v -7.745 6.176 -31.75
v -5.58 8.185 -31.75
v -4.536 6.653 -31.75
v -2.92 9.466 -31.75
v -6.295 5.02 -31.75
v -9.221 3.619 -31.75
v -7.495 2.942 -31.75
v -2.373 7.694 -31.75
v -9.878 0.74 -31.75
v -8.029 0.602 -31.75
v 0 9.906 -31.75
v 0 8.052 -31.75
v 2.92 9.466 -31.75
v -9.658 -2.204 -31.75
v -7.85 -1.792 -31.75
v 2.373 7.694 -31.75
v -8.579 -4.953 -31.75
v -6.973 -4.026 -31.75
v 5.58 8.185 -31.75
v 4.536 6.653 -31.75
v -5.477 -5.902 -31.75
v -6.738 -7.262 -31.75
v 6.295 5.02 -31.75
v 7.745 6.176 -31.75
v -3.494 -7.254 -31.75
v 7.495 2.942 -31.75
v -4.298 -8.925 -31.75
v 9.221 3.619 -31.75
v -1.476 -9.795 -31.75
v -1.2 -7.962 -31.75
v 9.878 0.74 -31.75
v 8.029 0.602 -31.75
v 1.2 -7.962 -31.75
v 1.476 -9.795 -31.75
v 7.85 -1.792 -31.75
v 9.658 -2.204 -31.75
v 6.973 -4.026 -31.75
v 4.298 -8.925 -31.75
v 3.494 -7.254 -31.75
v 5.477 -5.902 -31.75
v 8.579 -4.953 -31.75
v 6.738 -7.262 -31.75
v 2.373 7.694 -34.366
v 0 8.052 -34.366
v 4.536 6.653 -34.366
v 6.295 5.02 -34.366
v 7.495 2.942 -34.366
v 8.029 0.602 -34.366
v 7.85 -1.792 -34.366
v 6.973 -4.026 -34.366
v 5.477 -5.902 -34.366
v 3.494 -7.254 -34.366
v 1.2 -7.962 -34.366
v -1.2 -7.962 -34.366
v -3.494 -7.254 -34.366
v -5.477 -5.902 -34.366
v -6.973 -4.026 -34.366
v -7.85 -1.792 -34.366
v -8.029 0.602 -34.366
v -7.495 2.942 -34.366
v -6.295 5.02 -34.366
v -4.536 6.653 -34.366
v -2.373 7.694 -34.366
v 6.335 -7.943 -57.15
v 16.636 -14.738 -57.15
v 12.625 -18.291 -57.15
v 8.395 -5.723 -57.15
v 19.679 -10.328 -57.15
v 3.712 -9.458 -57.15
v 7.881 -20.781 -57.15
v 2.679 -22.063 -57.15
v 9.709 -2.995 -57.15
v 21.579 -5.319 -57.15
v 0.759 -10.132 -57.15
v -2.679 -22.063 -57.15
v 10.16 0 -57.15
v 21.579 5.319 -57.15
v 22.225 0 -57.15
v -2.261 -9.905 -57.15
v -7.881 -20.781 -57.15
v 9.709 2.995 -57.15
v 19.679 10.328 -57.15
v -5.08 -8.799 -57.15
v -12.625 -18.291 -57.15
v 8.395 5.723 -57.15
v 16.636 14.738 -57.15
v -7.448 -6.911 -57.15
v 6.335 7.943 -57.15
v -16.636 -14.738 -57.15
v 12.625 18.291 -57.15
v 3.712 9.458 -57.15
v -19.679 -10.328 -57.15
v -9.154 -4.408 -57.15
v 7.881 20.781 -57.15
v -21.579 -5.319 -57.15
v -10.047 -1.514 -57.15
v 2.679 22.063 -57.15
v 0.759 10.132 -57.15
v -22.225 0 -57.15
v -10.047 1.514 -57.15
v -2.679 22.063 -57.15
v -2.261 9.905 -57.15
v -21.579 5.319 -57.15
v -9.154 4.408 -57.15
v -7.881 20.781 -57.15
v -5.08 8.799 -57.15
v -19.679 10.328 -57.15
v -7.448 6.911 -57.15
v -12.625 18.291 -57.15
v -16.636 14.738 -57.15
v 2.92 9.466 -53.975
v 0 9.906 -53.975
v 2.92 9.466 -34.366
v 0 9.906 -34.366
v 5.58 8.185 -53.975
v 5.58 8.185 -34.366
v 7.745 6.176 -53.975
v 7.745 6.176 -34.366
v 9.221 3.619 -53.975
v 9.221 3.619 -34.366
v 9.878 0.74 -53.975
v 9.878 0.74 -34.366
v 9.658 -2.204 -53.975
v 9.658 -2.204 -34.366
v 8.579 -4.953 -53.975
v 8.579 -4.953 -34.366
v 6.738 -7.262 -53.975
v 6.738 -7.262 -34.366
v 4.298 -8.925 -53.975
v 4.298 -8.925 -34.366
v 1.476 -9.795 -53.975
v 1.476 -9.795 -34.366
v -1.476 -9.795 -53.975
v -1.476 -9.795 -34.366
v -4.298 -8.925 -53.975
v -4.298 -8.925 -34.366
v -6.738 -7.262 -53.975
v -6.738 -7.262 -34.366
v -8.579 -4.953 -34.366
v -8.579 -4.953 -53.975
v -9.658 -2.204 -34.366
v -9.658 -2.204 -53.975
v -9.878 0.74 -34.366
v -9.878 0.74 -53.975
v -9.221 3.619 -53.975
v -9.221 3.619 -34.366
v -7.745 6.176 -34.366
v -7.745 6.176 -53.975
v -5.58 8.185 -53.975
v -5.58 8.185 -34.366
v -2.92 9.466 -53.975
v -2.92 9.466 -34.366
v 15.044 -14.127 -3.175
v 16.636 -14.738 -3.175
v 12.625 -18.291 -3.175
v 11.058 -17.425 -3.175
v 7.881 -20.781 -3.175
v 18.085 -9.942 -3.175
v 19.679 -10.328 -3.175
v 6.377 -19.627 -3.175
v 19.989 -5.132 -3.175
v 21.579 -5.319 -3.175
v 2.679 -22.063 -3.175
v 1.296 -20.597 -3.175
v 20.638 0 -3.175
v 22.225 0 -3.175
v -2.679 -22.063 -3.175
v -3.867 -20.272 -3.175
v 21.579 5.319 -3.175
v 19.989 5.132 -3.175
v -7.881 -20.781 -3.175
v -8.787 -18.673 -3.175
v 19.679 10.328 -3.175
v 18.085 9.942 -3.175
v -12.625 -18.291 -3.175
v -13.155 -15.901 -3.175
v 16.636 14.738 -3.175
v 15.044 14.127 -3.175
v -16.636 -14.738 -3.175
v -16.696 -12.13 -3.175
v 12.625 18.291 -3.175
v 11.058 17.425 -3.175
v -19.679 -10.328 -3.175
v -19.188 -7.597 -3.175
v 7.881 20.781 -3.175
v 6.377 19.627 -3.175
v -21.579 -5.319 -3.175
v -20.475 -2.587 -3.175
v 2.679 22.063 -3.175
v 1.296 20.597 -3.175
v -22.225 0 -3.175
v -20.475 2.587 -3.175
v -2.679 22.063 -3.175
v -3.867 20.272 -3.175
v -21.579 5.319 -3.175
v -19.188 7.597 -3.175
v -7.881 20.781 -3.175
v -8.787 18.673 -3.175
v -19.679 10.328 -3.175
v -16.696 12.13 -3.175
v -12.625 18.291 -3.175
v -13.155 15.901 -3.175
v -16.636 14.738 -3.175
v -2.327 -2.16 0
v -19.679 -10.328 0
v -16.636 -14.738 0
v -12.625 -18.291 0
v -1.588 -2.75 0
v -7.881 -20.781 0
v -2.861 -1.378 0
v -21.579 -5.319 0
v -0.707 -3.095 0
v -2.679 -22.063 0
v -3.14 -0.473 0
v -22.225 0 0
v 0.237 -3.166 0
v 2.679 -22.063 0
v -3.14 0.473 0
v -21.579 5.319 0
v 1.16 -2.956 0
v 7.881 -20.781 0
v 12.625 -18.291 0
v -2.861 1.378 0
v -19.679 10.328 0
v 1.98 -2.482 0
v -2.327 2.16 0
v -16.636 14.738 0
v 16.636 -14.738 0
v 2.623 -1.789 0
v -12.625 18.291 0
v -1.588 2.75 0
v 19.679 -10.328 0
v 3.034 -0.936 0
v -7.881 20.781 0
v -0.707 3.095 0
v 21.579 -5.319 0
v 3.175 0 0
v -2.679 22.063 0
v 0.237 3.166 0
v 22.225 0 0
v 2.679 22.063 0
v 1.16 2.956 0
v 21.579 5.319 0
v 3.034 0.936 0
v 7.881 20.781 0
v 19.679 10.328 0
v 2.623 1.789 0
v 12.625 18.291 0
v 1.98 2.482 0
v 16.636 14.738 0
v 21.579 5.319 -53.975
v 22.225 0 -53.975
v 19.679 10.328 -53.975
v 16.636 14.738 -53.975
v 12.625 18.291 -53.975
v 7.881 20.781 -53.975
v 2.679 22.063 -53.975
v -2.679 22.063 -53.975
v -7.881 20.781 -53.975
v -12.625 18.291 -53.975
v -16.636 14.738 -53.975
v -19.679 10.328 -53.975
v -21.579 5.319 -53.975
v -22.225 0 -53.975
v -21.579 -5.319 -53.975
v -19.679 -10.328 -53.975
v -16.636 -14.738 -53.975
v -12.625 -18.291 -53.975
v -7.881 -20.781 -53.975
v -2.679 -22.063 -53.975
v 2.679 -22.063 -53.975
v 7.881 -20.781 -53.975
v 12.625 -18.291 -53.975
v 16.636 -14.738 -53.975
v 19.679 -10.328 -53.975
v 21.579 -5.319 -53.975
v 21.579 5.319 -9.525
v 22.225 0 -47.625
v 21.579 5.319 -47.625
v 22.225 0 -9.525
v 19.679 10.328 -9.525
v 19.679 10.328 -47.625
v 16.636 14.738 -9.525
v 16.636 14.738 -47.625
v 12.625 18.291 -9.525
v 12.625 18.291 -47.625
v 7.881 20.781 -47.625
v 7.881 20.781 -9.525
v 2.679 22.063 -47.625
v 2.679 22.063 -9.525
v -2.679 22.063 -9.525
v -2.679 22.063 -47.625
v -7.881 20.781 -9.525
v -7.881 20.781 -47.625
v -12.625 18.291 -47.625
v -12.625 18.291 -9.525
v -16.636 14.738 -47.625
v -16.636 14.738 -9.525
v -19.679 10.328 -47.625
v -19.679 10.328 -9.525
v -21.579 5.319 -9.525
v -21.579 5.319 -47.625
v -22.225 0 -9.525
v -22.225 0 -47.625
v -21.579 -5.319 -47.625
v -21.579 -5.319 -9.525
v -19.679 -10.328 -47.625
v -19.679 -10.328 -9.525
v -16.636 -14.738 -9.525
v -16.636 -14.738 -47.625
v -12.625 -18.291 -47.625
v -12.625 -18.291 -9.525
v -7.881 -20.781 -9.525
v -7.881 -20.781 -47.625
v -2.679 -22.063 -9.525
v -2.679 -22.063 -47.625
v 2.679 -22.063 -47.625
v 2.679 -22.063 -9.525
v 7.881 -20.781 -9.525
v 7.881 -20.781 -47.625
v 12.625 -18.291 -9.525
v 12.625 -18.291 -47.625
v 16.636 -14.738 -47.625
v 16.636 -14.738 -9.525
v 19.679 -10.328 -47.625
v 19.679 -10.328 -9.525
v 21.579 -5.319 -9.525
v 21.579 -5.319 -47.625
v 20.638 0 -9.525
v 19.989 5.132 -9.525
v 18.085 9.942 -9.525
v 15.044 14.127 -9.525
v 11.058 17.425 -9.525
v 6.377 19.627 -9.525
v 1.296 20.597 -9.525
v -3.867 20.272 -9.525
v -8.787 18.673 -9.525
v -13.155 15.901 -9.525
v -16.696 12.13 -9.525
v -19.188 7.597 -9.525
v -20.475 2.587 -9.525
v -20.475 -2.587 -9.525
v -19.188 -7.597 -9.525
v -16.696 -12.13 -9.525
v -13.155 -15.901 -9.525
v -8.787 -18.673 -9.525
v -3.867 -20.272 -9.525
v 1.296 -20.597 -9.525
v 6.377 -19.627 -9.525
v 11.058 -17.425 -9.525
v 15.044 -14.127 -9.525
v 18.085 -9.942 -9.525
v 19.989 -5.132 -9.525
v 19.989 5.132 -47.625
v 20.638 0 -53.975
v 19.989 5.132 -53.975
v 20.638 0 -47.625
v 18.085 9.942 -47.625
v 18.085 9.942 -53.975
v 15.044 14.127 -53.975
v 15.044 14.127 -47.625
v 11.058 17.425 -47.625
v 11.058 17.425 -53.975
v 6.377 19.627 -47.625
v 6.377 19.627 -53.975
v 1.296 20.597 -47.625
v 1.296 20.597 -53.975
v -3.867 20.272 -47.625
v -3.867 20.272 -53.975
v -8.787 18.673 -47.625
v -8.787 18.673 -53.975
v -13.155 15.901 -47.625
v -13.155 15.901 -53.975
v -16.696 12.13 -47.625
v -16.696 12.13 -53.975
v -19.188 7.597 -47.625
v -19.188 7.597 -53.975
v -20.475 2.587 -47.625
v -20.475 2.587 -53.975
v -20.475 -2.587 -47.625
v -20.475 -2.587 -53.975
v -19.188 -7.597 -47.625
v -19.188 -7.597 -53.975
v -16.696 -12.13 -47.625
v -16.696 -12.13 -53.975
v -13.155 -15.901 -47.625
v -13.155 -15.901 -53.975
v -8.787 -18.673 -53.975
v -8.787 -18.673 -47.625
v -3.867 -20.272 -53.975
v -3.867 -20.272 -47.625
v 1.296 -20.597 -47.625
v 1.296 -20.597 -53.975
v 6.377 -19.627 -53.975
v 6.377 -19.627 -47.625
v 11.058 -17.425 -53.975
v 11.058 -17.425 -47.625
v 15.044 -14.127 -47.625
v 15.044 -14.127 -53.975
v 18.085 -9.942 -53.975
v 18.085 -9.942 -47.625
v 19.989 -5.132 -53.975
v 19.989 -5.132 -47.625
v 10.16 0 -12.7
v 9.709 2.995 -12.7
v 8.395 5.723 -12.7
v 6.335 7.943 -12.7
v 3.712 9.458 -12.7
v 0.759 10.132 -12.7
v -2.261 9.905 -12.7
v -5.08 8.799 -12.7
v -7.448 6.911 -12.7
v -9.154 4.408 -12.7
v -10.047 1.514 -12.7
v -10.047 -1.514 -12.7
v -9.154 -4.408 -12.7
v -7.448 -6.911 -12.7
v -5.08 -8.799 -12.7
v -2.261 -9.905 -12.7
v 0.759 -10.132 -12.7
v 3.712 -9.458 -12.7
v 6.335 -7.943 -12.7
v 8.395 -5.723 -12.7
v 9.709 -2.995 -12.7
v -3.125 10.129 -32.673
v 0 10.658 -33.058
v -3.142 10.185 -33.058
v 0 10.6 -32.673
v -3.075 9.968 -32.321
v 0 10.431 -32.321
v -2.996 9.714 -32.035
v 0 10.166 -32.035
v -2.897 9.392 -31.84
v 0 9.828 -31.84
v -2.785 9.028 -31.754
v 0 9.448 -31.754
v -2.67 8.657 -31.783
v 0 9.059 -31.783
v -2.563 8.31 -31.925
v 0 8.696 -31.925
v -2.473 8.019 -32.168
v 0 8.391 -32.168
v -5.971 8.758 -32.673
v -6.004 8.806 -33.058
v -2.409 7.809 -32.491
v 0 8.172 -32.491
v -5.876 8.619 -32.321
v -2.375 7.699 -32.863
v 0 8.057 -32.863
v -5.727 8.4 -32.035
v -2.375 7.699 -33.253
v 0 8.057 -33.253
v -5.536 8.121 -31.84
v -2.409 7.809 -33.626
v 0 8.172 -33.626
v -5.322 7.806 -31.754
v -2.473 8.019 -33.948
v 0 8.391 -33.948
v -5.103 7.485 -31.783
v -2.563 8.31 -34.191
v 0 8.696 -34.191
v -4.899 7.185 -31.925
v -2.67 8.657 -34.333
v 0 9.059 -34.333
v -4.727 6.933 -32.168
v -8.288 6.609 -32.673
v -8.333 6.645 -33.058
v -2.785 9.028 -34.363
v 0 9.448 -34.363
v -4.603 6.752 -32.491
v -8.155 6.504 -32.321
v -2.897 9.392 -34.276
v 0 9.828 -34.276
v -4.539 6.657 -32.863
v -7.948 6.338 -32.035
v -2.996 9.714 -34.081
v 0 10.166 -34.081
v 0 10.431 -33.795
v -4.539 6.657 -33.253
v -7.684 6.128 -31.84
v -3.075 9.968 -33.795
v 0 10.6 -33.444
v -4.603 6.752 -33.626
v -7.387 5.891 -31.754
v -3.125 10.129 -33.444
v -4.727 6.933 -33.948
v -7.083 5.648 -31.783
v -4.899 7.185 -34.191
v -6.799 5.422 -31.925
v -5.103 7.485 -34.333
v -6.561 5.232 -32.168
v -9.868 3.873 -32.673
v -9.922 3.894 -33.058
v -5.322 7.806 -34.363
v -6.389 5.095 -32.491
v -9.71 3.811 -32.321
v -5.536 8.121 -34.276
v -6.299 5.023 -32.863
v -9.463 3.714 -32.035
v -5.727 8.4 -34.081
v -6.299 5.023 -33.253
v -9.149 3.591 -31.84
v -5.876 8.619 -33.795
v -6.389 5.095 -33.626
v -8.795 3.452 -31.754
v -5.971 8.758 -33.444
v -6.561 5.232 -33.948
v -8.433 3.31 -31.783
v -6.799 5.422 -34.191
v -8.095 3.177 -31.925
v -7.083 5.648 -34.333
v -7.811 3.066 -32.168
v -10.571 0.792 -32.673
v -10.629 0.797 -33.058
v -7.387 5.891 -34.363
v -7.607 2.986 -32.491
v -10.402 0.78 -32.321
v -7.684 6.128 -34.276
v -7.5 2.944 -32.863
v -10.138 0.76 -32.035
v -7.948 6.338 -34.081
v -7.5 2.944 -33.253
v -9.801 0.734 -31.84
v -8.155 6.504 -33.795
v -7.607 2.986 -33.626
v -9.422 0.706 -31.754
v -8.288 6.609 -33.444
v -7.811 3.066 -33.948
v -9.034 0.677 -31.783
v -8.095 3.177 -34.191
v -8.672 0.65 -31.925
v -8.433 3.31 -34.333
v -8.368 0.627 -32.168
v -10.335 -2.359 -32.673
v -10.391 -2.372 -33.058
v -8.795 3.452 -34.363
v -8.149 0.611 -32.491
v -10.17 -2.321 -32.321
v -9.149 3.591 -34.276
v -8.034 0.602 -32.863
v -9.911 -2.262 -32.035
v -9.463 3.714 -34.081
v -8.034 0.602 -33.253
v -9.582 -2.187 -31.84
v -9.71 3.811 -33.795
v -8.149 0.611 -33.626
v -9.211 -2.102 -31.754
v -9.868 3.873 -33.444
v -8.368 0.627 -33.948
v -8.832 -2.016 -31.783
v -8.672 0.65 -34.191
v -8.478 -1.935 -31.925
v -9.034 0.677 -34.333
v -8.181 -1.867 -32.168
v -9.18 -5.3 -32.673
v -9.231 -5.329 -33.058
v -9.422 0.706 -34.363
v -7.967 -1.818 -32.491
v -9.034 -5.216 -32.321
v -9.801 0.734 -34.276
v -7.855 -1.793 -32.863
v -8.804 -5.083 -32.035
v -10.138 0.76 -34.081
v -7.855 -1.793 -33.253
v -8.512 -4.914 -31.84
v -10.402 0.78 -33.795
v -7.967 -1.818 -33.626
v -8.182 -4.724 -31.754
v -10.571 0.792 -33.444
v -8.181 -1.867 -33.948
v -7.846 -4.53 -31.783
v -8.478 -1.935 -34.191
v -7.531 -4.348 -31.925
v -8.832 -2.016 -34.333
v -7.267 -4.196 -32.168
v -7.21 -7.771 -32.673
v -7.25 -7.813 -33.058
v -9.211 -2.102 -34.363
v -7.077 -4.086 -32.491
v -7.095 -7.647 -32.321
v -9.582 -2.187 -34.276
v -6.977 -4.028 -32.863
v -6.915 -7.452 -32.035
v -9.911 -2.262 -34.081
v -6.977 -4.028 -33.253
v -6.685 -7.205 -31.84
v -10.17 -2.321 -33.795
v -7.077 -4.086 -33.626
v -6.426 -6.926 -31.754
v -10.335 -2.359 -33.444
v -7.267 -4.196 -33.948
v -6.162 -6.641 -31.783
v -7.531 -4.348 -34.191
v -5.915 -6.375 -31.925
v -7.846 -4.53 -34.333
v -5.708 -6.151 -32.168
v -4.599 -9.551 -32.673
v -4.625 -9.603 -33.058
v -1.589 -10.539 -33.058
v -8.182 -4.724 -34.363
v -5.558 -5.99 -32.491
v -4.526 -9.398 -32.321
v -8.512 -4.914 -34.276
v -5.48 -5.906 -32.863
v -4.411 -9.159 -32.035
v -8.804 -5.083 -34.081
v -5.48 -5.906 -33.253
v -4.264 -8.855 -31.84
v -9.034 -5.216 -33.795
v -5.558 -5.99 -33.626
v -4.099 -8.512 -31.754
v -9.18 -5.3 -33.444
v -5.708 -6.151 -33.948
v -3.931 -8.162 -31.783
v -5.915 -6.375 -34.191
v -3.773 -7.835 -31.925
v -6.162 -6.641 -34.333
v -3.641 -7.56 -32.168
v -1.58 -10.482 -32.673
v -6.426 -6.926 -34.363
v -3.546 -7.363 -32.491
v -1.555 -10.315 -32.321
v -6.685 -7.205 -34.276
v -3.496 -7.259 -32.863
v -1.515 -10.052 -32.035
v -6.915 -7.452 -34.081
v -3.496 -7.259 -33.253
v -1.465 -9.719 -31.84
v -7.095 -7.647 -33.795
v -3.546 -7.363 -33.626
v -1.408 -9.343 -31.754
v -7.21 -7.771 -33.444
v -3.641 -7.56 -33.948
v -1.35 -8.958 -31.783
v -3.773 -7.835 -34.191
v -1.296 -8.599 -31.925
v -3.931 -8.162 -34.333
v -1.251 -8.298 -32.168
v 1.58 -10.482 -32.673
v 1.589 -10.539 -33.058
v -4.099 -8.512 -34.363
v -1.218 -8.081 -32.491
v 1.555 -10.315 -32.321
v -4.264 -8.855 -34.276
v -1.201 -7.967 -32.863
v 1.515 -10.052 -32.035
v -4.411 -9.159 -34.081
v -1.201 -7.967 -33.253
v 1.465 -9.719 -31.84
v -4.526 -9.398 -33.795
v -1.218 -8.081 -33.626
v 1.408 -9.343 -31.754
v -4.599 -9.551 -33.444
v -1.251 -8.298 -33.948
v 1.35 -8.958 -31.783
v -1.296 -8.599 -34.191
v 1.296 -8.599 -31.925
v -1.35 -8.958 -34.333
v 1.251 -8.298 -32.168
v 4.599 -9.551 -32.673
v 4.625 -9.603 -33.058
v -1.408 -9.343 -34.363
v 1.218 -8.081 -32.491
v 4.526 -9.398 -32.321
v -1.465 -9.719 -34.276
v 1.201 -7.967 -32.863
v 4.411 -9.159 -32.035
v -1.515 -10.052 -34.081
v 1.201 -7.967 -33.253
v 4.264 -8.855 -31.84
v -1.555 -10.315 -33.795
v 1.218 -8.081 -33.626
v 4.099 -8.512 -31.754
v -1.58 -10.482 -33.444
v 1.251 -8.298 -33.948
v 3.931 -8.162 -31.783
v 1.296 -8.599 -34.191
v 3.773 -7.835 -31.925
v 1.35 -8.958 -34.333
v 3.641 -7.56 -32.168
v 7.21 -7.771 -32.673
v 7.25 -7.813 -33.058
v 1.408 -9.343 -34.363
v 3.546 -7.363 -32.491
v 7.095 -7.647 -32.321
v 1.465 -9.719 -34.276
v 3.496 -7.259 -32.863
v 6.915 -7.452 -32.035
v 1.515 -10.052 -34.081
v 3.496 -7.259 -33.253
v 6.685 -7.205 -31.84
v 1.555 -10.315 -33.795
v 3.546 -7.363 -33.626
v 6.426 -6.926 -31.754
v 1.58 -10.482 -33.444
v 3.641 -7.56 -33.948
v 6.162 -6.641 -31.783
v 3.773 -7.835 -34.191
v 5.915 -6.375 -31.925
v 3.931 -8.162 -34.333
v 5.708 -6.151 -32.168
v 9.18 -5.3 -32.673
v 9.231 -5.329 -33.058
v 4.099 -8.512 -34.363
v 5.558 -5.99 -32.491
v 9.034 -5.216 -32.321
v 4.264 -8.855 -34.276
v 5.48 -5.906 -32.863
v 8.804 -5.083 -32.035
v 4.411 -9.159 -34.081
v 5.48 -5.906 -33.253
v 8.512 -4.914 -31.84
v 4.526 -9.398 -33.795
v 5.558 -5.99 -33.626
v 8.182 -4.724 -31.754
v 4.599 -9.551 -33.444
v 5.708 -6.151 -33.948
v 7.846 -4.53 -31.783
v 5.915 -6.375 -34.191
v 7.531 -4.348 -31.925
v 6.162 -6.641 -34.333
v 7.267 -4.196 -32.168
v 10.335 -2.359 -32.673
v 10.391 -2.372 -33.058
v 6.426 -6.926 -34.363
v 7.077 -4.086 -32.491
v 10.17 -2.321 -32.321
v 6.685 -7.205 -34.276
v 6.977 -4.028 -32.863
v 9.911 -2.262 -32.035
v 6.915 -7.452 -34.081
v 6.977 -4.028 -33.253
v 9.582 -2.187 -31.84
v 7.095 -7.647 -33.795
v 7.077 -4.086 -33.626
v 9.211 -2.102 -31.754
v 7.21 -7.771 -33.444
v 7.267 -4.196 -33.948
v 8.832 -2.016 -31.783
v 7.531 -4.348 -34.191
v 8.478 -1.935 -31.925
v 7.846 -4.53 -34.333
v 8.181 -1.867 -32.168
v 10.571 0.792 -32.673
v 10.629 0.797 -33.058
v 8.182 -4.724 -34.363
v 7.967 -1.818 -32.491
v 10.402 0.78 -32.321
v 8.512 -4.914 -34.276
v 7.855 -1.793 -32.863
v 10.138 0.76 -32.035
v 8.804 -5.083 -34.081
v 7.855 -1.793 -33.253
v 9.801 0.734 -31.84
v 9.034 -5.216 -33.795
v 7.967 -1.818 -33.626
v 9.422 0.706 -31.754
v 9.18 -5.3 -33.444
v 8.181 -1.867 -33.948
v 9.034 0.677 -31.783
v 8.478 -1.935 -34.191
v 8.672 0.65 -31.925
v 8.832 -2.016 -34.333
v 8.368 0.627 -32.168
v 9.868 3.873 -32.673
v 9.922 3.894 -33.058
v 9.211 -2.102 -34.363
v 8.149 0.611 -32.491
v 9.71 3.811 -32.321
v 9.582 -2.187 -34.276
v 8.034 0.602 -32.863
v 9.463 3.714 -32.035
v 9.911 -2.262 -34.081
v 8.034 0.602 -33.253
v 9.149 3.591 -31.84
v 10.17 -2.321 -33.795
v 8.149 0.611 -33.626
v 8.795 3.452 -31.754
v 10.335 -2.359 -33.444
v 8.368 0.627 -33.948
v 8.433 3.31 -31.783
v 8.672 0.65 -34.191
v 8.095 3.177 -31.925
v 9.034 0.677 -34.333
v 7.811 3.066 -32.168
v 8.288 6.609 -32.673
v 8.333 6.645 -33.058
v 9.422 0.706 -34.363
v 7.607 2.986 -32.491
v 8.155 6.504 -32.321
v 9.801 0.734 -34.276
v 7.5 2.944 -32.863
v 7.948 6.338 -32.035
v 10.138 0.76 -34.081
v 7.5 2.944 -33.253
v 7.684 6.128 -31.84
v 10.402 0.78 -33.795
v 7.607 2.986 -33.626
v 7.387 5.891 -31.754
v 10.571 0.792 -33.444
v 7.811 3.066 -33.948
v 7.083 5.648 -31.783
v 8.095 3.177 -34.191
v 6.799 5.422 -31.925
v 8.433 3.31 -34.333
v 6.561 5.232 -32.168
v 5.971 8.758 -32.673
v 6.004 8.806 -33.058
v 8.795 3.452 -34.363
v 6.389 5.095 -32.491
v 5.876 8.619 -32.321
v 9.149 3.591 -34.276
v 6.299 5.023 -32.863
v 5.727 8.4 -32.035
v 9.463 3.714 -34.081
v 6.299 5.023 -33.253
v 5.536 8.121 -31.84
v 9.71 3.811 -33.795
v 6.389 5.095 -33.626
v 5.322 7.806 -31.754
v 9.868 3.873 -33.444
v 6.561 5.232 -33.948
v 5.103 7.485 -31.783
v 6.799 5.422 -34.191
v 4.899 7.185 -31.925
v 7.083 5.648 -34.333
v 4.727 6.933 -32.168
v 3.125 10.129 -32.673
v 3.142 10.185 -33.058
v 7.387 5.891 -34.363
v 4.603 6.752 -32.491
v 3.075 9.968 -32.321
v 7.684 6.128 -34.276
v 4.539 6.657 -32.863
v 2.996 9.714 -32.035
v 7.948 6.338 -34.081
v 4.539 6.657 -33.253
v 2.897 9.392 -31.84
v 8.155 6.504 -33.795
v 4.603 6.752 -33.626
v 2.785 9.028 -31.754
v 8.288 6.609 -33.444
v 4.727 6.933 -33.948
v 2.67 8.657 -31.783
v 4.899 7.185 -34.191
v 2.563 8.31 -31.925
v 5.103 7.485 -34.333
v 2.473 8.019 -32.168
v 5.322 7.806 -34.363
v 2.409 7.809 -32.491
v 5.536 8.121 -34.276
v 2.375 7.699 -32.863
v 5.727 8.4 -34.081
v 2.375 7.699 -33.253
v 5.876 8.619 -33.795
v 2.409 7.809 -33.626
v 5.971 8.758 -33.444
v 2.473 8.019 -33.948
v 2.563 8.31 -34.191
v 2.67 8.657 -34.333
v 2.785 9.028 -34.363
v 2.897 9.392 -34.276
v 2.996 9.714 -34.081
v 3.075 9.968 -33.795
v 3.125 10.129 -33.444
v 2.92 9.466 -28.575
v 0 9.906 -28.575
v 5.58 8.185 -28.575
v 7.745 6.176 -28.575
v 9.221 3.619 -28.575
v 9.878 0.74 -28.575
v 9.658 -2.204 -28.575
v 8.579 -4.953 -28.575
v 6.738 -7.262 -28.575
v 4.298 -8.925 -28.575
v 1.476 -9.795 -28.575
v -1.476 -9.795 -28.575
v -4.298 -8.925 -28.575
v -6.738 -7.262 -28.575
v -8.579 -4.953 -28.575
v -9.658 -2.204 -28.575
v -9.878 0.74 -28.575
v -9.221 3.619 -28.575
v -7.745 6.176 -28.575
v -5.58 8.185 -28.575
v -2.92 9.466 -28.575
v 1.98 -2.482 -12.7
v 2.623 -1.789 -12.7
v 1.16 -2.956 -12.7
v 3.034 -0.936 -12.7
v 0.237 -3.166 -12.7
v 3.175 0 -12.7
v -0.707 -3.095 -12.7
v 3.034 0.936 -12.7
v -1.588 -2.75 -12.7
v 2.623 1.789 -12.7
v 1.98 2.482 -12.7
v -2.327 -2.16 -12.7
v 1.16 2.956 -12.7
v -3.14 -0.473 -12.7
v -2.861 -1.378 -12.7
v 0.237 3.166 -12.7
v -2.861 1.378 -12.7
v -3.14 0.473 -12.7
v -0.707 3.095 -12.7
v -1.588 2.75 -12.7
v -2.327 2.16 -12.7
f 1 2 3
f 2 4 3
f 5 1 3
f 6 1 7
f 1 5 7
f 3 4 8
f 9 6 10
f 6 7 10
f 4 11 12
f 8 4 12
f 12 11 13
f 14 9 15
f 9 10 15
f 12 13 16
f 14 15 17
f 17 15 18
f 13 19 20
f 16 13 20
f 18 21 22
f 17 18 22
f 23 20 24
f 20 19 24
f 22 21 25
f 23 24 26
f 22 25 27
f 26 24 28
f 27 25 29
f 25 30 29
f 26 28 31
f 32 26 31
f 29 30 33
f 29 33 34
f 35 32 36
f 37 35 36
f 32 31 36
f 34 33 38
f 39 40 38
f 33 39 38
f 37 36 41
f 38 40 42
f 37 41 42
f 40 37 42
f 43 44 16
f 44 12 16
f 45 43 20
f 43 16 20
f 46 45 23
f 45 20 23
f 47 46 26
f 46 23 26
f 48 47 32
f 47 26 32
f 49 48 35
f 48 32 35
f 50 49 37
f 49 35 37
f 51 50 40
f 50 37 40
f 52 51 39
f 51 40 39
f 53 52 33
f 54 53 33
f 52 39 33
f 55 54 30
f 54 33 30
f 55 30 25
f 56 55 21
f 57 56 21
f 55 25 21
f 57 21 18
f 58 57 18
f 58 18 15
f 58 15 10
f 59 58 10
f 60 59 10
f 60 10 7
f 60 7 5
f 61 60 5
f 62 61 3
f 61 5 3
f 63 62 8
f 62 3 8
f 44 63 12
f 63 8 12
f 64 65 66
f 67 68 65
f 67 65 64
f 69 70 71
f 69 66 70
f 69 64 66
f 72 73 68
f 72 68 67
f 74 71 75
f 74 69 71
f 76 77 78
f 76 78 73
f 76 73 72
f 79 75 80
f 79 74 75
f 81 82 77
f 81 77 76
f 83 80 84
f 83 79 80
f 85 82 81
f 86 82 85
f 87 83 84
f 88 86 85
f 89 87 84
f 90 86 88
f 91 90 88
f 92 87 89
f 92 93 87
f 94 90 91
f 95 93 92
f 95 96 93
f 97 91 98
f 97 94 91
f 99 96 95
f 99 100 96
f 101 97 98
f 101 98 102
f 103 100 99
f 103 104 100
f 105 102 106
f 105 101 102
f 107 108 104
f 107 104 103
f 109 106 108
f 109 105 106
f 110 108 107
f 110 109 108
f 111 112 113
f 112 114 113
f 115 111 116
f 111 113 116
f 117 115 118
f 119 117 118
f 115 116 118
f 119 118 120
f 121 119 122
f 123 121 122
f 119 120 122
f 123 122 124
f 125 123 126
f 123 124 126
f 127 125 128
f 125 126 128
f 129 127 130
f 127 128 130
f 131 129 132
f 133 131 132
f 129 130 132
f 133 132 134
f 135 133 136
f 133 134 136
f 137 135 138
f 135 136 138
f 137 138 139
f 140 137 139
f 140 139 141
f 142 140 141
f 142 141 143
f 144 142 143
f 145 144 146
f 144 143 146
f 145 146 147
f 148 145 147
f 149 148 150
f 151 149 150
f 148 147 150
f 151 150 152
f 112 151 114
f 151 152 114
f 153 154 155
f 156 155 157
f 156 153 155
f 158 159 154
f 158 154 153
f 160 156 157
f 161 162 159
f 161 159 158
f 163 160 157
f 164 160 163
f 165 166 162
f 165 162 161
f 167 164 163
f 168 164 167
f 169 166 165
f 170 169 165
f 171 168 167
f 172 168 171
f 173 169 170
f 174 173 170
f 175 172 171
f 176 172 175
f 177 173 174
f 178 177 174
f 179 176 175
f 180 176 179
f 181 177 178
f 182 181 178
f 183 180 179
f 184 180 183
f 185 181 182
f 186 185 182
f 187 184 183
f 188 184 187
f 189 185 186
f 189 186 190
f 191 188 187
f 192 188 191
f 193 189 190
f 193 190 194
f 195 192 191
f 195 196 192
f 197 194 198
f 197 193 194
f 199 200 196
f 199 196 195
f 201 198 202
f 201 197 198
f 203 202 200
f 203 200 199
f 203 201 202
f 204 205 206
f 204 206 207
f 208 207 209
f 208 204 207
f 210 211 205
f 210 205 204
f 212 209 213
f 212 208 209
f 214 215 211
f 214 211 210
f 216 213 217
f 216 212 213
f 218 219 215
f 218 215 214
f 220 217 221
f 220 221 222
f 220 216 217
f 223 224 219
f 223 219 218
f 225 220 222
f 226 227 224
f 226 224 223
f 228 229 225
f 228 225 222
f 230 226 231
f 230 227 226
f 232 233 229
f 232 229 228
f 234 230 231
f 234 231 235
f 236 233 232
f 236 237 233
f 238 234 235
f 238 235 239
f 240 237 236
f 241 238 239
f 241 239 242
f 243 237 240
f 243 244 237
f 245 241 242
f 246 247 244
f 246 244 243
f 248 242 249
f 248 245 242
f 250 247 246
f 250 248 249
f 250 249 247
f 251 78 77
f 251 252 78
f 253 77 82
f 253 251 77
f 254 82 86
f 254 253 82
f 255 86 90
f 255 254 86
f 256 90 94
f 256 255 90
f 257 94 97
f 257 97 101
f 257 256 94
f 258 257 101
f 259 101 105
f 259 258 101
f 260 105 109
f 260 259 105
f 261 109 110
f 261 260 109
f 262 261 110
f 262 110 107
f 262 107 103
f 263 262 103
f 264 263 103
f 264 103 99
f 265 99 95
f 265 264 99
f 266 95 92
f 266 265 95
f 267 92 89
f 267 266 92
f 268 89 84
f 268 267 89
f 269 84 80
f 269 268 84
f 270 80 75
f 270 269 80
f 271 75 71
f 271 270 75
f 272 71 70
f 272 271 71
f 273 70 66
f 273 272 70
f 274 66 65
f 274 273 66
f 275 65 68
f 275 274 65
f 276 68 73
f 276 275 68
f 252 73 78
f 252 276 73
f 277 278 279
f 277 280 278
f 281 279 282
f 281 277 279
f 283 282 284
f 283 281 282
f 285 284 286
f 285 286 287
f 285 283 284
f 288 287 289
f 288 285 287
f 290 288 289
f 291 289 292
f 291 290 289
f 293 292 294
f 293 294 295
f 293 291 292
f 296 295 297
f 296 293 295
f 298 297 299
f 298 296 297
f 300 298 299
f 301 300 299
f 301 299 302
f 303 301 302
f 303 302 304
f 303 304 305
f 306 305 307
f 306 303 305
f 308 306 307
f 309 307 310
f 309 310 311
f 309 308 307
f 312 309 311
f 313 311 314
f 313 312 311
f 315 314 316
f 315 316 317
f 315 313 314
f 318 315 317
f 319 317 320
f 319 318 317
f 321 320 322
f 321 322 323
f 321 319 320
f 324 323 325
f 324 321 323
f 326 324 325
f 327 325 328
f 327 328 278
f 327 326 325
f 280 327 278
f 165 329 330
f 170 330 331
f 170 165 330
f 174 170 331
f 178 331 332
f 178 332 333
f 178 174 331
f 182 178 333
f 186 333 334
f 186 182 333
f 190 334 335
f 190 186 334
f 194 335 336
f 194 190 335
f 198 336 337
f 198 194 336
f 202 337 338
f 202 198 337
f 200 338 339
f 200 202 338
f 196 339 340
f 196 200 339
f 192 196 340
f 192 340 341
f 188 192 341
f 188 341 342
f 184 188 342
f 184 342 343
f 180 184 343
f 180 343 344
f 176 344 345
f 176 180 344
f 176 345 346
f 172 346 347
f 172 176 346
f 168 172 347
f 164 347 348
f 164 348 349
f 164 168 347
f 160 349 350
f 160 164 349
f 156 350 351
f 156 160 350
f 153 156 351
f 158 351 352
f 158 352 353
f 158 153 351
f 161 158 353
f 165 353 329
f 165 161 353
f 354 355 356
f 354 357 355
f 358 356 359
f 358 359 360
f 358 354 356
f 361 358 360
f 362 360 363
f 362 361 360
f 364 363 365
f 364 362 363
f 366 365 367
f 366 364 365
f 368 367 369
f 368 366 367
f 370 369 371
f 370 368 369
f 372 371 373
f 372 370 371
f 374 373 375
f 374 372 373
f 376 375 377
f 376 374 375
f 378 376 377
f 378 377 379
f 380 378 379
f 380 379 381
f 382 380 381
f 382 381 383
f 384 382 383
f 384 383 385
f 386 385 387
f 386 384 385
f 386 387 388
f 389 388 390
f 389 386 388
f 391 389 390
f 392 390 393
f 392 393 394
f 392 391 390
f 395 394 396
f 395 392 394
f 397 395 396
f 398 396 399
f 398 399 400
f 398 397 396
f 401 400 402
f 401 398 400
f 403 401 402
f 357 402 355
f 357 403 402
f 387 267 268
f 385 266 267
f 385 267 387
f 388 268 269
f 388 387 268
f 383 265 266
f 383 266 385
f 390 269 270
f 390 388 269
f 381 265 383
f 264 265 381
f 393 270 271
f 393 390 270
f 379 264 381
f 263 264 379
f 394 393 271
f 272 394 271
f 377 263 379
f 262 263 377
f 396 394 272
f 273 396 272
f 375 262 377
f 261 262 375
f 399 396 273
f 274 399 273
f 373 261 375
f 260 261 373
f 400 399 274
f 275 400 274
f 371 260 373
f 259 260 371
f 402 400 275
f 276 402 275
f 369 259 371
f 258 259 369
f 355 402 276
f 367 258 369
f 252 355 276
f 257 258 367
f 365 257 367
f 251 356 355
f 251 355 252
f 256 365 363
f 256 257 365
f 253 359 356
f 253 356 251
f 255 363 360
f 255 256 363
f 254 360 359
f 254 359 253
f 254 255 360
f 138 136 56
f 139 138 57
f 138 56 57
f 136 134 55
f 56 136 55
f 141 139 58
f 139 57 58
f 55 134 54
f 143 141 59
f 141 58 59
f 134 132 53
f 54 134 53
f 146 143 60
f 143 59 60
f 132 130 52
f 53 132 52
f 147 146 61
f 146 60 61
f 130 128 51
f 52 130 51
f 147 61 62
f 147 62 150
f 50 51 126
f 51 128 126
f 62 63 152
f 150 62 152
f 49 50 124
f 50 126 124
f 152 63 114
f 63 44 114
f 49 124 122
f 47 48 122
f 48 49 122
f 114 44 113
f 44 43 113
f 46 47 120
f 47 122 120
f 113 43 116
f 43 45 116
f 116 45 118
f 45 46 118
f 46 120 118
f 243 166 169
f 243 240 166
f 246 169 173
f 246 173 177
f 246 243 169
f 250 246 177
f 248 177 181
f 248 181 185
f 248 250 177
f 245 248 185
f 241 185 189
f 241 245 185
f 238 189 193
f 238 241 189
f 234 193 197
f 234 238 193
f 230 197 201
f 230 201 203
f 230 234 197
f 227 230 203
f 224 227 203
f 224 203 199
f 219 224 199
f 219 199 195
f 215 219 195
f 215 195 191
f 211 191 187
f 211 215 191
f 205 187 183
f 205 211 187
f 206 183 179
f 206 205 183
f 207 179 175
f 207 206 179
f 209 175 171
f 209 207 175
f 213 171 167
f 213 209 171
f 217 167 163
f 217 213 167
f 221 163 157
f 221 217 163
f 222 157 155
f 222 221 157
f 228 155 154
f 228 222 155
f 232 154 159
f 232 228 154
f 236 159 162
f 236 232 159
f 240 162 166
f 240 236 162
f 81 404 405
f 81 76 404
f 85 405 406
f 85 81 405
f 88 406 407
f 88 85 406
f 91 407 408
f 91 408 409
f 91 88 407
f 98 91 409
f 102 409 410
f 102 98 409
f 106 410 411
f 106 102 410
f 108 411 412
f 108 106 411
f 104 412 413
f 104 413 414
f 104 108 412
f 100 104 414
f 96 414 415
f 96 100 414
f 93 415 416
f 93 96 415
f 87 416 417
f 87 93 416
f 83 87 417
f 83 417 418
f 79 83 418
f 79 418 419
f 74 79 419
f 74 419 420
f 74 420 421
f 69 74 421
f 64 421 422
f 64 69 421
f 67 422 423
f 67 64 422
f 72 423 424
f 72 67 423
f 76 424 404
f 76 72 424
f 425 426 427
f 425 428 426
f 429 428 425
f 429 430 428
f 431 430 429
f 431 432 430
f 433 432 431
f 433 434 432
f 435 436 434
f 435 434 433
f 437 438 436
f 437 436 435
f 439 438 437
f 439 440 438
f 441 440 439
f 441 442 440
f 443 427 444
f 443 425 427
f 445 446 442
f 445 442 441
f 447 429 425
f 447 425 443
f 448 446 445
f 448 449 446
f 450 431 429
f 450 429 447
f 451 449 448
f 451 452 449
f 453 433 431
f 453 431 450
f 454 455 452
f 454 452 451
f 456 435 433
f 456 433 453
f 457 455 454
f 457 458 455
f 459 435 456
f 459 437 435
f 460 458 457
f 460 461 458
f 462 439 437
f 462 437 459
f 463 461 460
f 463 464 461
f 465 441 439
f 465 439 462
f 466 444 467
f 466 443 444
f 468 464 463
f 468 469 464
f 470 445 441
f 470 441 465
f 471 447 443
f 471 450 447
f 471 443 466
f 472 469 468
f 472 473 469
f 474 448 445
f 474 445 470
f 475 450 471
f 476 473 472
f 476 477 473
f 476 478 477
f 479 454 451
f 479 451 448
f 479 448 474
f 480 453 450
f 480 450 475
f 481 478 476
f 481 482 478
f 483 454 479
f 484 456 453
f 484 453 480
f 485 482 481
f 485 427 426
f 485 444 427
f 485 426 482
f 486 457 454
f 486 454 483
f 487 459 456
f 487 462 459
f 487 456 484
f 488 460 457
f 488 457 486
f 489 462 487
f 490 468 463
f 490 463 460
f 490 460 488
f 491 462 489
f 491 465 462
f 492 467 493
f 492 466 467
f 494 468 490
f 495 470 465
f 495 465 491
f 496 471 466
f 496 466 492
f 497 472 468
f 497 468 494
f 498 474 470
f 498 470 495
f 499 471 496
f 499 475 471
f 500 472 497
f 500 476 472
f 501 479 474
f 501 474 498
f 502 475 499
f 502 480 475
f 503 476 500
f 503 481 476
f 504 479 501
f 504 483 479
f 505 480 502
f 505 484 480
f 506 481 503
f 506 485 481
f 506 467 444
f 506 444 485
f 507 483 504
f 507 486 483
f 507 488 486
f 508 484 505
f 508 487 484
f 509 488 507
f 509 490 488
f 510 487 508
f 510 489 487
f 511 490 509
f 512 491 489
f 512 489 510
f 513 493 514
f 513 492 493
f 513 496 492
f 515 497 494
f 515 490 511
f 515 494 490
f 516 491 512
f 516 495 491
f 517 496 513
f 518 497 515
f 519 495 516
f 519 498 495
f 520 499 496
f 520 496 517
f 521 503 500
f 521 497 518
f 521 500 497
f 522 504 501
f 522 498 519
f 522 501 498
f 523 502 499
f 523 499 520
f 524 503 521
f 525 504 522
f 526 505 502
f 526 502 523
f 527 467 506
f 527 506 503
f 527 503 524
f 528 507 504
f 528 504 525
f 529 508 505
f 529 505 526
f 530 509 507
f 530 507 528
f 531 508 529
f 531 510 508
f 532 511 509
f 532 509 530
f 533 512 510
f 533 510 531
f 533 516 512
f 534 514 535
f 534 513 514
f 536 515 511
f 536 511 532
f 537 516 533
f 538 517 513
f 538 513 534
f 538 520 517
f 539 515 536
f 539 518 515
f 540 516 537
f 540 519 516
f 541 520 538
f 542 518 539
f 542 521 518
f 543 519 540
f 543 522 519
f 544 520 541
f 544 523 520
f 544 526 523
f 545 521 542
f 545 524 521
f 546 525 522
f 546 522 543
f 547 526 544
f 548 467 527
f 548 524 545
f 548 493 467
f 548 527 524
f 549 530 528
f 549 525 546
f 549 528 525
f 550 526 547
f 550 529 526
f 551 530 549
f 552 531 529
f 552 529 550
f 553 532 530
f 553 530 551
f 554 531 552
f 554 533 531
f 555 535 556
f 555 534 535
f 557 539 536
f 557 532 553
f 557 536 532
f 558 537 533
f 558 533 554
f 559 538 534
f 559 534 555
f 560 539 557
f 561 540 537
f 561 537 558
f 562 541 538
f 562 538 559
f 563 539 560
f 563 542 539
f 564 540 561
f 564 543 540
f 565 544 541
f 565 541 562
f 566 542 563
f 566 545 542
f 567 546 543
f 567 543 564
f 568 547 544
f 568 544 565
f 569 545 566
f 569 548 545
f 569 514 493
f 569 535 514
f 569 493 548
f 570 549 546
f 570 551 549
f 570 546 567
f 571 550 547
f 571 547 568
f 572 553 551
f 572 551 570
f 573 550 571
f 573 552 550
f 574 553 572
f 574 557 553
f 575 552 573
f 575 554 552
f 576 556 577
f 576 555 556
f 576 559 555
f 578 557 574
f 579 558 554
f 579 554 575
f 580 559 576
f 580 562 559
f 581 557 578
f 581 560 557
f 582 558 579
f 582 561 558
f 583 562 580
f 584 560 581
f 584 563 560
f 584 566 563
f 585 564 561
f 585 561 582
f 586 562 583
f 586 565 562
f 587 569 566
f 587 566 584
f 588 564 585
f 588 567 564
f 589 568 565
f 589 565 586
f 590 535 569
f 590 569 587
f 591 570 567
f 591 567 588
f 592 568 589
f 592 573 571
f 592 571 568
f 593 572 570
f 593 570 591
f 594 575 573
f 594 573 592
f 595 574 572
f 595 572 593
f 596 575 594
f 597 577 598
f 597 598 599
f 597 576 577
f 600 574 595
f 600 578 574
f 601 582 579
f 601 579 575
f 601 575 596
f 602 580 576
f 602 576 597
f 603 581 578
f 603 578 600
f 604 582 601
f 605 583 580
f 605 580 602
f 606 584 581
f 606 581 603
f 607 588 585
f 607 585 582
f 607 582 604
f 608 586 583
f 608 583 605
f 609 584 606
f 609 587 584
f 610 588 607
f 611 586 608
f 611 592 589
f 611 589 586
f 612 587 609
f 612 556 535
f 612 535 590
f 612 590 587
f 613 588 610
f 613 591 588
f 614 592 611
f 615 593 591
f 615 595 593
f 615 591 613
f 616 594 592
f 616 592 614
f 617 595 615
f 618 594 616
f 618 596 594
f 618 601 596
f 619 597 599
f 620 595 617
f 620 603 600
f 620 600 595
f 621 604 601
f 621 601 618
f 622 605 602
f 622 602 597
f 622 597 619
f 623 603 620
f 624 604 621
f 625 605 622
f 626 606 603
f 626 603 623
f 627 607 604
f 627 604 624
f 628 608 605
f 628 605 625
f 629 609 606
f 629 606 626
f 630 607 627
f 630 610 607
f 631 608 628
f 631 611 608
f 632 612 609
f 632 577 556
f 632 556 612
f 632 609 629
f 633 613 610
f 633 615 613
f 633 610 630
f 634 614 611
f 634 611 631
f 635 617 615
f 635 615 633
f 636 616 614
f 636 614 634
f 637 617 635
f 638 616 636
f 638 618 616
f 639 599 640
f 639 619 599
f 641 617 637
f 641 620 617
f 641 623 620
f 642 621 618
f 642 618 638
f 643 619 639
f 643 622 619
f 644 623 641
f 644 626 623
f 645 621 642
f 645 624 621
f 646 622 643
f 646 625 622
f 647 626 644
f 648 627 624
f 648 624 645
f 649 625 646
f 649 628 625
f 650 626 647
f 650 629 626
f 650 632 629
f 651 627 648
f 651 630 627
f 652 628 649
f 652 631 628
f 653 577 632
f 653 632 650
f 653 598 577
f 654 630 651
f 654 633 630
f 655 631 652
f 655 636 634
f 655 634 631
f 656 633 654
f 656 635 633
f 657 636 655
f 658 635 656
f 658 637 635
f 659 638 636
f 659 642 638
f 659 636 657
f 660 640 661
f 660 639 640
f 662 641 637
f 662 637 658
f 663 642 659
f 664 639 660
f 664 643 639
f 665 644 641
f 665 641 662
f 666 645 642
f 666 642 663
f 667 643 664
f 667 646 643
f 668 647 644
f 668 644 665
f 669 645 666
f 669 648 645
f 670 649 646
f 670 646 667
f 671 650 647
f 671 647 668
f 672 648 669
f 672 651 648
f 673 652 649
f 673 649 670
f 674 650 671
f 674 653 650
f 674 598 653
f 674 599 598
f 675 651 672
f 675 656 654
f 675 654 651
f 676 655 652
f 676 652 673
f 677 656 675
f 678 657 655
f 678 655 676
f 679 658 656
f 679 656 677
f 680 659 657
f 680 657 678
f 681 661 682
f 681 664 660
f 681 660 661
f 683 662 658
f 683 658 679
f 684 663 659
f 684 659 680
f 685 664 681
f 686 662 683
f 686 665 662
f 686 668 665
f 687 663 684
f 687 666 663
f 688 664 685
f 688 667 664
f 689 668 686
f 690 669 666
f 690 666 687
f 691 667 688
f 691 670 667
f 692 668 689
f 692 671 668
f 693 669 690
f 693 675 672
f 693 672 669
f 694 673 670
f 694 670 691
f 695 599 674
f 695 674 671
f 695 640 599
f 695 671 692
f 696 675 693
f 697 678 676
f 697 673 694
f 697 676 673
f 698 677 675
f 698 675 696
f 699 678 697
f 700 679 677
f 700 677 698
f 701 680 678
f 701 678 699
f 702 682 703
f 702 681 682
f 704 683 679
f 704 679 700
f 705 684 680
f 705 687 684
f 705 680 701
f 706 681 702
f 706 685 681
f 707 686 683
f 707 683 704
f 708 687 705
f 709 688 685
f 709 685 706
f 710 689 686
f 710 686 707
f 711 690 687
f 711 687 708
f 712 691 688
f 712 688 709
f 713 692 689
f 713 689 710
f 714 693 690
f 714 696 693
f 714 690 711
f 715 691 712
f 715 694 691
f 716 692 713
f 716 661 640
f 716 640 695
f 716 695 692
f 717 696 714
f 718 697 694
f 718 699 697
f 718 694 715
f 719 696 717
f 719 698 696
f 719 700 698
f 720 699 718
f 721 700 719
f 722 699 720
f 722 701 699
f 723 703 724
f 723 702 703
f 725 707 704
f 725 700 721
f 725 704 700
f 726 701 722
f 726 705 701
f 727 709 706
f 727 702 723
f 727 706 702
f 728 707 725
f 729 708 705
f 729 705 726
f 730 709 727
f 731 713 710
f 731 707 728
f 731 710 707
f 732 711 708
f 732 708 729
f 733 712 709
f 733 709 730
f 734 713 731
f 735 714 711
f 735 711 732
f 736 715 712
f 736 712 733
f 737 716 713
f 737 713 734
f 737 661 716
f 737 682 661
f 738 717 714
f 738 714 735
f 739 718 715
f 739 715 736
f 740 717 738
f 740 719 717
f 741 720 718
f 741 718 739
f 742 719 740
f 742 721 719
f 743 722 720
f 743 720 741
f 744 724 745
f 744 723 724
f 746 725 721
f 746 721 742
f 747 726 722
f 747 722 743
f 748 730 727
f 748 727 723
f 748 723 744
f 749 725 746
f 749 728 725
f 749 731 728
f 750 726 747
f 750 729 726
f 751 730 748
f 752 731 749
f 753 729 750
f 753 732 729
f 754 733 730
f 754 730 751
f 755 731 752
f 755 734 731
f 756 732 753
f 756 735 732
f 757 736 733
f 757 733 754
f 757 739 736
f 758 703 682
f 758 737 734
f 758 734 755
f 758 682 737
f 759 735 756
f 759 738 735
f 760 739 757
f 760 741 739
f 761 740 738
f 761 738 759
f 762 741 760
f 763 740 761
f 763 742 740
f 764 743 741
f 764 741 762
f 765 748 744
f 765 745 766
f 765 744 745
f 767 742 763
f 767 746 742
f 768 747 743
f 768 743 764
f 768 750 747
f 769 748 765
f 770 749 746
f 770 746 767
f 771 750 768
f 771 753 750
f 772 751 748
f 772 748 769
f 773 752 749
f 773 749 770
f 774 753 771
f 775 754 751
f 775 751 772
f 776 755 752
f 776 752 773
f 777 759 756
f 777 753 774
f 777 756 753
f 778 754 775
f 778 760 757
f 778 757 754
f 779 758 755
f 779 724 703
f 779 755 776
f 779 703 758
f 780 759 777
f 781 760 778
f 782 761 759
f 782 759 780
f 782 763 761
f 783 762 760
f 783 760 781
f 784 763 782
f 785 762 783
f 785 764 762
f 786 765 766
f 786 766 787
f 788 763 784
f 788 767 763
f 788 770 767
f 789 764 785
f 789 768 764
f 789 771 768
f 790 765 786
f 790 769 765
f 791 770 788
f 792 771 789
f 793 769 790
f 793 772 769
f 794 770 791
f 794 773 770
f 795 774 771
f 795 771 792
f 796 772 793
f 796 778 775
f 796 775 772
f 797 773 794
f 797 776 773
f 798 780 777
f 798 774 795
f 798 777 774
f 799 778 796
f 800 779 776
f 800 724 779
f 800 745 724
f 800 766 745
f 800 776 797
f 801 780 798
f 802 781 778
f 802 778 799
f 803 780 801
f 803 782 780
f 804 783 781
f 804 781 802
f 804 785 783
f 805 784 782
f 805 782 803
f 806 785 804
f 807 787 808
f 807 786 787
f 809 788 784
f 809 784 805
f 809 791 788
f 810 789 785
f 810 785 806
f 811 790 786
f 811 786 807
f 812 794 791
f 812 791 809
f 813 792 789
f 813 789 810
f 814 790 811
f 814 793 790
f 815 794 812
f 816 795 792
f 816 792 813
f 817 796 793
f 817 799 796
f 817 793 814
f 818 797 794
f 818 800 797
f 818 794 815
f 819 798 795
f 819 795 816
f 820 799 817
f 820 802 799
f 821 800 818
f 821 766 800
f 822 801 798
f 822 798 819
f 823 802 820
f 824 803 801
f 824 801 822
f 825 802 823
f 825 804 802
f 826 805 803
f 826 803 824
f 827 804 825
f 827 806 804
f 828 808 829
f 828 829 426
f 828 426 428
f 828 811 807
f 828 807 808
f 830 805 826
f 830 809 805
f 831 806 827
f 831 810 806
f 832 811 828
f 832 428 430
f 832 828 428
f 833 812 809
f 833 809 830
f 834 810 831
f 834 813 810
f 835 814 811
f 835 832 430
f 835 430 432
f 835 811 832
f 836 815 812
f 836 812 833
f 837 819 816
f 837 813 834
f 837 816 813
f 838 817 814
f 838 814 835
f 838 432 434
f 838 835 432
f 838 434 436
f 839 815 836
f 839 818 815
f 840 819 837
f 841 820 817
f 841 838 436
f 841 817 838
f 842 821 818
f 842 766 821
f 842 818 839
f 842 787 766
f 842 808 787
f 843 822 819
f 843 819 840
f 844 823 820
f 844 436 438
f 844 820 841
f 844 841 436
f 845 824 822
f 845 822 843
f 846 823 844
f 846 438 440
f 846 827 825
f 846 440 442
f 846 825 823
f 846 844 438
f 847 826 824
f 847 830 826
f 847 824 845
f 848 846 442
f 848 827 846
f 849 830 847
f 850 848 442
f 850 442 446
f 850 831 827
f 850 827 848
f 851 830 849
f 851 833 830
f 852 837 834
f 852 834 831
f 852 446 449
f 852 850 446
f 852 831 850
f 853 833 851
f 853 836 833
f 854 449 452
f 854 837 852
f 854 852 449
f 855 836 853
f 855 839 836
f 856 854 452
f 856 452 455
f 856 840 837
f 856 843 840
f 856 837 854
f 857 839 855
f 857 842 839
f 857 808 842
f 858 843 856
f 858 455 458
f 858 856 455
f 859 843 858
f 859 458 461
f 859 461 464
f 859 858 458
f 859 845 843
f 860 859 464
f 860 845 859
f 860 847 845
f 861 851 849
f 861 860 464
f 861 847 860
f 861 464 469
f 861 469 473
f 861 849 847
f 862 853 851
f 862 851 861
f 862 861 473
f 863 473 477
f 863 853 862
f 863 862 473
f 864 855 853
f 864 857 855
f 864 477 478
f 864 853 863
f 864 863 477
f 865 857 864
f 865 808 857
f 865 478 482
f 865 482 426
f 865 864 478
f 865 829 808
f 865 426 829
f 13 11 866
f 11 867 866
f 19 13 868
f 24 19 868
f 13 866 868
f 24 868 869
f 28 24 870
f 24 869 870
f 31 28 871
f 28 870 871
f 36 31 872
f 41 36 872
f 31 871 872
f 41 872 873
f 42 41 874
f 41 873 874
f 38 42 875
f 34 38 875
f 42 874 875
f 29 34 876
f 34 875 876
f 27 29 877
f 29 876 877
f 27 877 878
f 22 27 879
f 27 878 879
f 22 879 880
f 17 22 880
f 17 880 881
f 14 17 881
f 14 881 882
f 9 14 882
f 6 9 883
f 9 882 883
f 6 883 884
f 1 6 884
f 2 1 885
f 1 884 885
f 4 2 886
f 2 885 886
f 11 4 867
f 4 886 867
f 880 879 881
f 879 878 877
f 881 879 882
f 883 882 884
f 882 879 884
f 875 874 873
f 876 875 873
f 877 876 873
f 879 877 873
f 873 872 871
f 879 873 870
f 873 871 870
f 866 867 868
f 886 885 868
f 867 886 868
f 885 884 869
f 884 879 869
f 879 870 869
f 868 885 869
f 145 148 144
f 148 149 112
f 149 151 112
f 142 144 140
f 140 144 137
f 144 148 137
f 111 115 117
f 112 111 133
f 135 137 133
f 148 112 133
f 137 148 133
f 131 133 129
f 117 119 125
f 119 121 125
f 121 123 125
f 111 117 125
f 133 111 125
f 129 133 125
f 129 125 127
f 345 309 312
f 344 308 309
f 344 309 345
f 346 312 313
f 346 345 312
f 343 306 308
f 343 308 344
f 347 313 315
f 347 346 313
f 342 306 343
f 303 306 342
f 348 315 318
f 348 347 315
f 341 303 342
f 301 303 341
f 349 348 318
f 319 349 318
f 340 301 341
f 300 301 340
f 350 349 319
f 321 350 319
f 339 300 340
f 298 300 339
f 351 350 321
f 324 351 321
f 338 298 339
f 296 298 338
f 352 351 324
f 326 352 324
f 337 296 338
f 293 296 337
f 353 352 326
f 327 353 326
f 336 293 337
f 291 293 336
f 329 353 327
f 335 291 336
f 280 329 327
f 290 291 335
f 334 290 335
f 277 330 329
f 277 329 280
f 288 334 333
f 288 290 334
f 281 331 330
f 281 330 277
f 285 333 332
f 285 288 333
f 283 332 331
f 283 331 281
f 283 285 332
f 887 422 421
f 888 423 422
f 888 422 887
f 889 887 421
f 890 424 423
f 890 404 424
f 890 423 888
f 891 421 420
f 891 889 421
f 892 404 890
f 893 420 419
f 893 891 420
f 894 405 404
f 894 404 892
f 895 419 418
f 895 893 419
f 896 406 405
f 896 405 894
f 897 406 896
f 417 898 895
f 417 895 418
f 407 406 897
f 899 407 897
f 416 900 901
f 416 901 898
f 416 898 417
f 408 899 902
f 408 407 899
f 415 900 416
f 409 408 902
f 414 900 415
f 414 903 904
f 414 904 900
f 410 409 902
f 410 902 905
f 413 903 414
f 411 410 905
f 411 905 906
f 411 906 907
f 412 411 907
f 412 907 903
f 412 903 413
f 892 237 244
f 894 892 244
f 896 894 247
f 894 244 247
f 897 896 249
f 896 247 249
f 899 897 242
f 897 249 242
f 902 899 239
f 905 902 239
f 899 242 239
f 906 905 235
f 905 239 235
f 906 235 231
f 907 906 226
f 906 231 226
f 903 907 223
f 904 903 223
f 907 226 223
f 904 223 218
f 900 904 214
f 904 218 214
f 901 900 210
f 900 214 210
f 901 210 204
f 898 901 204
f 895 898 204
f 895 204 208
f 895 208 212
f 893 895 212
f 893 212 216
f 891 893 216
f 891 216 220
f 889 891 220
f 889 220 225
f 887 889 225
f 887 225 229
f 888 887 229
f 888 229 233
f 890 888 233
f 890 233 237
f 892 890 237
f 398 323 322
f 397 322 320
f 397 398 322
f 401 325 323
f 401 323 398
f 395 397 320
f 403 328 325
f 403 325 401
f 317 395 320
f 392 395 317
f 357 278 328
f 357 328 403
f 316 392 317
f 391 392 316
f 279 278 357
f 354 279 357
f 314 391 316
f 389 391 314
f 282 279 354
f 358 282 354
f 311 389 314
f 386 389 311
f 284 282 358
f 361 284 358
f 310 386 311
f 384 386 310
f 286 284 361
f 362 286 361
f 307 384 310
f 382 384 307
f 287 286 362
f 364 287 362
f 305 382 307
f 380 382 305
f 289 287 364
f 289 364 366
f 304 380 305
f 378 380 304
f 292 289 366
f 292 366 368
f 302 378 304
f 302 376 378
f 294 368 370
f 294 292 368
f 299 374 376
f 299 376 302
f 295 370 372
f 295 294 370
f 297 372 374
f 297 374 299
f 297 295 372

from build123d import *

# Parameters (mm, degrees)
F4_R     = 3.175
F5_DEPTH = 57.151
F6_R     = 1.3081


with BuildPart() as f1:
    # F0 (on Front) → F1 (revolve)
    with BuildSketch(Plane.XZ):
        Polygon((22.225, 0), (0, 0), (0, -12.7), (10.16, -12.7), (10.16, -57.15), (22.225, -57.15), (22.225, -53.975), (20.6375, -53.975), (20.6375, -47.625), (22.225, -47.625), (22.225, -9.525), (20.6375, -9.525), (20.6375, -3.175), (22.225, -3.175), align=None)
    revolve(axis=Axis((0, 0, -6.35), (0, 0, 1)))

    # F4 (on face) → F5 (cut, through all)
    with BuildSketch(Plane.XY):
        Circle(F4_R)
    extrude(amount=-F5_DEPTH, mode=Mode.SUBTRACT)


with BuildPart() as f3:
    # F2 (on Right) → F3 (revolve)
    with BuildSketch(Plane.YZ):
        Polygon((9.906, -28.575), (0, -28.575), (0, -53.975), (9.906, -53.975), (9.906, -34.3662), (8.0518, -34.3662), (8.0518, -31.75), (9.906, -31.75), align=None)
    revolve(axis=Axis((0, 0, -41.275), (0, 0, -1)))


with BuildPart() as f7:
    # F6 (on Right) → F7 (revolve)
    with BuildSketch(Plane.YZ):
        with Locations((9.350375, -33.0581)):
            Circle(F6_R)
    revolve(axis=Axis((0, 0, -30.0969633236), (0, 0, 1)))


solid = Compound([f1.part, f3.part, f7.part])
